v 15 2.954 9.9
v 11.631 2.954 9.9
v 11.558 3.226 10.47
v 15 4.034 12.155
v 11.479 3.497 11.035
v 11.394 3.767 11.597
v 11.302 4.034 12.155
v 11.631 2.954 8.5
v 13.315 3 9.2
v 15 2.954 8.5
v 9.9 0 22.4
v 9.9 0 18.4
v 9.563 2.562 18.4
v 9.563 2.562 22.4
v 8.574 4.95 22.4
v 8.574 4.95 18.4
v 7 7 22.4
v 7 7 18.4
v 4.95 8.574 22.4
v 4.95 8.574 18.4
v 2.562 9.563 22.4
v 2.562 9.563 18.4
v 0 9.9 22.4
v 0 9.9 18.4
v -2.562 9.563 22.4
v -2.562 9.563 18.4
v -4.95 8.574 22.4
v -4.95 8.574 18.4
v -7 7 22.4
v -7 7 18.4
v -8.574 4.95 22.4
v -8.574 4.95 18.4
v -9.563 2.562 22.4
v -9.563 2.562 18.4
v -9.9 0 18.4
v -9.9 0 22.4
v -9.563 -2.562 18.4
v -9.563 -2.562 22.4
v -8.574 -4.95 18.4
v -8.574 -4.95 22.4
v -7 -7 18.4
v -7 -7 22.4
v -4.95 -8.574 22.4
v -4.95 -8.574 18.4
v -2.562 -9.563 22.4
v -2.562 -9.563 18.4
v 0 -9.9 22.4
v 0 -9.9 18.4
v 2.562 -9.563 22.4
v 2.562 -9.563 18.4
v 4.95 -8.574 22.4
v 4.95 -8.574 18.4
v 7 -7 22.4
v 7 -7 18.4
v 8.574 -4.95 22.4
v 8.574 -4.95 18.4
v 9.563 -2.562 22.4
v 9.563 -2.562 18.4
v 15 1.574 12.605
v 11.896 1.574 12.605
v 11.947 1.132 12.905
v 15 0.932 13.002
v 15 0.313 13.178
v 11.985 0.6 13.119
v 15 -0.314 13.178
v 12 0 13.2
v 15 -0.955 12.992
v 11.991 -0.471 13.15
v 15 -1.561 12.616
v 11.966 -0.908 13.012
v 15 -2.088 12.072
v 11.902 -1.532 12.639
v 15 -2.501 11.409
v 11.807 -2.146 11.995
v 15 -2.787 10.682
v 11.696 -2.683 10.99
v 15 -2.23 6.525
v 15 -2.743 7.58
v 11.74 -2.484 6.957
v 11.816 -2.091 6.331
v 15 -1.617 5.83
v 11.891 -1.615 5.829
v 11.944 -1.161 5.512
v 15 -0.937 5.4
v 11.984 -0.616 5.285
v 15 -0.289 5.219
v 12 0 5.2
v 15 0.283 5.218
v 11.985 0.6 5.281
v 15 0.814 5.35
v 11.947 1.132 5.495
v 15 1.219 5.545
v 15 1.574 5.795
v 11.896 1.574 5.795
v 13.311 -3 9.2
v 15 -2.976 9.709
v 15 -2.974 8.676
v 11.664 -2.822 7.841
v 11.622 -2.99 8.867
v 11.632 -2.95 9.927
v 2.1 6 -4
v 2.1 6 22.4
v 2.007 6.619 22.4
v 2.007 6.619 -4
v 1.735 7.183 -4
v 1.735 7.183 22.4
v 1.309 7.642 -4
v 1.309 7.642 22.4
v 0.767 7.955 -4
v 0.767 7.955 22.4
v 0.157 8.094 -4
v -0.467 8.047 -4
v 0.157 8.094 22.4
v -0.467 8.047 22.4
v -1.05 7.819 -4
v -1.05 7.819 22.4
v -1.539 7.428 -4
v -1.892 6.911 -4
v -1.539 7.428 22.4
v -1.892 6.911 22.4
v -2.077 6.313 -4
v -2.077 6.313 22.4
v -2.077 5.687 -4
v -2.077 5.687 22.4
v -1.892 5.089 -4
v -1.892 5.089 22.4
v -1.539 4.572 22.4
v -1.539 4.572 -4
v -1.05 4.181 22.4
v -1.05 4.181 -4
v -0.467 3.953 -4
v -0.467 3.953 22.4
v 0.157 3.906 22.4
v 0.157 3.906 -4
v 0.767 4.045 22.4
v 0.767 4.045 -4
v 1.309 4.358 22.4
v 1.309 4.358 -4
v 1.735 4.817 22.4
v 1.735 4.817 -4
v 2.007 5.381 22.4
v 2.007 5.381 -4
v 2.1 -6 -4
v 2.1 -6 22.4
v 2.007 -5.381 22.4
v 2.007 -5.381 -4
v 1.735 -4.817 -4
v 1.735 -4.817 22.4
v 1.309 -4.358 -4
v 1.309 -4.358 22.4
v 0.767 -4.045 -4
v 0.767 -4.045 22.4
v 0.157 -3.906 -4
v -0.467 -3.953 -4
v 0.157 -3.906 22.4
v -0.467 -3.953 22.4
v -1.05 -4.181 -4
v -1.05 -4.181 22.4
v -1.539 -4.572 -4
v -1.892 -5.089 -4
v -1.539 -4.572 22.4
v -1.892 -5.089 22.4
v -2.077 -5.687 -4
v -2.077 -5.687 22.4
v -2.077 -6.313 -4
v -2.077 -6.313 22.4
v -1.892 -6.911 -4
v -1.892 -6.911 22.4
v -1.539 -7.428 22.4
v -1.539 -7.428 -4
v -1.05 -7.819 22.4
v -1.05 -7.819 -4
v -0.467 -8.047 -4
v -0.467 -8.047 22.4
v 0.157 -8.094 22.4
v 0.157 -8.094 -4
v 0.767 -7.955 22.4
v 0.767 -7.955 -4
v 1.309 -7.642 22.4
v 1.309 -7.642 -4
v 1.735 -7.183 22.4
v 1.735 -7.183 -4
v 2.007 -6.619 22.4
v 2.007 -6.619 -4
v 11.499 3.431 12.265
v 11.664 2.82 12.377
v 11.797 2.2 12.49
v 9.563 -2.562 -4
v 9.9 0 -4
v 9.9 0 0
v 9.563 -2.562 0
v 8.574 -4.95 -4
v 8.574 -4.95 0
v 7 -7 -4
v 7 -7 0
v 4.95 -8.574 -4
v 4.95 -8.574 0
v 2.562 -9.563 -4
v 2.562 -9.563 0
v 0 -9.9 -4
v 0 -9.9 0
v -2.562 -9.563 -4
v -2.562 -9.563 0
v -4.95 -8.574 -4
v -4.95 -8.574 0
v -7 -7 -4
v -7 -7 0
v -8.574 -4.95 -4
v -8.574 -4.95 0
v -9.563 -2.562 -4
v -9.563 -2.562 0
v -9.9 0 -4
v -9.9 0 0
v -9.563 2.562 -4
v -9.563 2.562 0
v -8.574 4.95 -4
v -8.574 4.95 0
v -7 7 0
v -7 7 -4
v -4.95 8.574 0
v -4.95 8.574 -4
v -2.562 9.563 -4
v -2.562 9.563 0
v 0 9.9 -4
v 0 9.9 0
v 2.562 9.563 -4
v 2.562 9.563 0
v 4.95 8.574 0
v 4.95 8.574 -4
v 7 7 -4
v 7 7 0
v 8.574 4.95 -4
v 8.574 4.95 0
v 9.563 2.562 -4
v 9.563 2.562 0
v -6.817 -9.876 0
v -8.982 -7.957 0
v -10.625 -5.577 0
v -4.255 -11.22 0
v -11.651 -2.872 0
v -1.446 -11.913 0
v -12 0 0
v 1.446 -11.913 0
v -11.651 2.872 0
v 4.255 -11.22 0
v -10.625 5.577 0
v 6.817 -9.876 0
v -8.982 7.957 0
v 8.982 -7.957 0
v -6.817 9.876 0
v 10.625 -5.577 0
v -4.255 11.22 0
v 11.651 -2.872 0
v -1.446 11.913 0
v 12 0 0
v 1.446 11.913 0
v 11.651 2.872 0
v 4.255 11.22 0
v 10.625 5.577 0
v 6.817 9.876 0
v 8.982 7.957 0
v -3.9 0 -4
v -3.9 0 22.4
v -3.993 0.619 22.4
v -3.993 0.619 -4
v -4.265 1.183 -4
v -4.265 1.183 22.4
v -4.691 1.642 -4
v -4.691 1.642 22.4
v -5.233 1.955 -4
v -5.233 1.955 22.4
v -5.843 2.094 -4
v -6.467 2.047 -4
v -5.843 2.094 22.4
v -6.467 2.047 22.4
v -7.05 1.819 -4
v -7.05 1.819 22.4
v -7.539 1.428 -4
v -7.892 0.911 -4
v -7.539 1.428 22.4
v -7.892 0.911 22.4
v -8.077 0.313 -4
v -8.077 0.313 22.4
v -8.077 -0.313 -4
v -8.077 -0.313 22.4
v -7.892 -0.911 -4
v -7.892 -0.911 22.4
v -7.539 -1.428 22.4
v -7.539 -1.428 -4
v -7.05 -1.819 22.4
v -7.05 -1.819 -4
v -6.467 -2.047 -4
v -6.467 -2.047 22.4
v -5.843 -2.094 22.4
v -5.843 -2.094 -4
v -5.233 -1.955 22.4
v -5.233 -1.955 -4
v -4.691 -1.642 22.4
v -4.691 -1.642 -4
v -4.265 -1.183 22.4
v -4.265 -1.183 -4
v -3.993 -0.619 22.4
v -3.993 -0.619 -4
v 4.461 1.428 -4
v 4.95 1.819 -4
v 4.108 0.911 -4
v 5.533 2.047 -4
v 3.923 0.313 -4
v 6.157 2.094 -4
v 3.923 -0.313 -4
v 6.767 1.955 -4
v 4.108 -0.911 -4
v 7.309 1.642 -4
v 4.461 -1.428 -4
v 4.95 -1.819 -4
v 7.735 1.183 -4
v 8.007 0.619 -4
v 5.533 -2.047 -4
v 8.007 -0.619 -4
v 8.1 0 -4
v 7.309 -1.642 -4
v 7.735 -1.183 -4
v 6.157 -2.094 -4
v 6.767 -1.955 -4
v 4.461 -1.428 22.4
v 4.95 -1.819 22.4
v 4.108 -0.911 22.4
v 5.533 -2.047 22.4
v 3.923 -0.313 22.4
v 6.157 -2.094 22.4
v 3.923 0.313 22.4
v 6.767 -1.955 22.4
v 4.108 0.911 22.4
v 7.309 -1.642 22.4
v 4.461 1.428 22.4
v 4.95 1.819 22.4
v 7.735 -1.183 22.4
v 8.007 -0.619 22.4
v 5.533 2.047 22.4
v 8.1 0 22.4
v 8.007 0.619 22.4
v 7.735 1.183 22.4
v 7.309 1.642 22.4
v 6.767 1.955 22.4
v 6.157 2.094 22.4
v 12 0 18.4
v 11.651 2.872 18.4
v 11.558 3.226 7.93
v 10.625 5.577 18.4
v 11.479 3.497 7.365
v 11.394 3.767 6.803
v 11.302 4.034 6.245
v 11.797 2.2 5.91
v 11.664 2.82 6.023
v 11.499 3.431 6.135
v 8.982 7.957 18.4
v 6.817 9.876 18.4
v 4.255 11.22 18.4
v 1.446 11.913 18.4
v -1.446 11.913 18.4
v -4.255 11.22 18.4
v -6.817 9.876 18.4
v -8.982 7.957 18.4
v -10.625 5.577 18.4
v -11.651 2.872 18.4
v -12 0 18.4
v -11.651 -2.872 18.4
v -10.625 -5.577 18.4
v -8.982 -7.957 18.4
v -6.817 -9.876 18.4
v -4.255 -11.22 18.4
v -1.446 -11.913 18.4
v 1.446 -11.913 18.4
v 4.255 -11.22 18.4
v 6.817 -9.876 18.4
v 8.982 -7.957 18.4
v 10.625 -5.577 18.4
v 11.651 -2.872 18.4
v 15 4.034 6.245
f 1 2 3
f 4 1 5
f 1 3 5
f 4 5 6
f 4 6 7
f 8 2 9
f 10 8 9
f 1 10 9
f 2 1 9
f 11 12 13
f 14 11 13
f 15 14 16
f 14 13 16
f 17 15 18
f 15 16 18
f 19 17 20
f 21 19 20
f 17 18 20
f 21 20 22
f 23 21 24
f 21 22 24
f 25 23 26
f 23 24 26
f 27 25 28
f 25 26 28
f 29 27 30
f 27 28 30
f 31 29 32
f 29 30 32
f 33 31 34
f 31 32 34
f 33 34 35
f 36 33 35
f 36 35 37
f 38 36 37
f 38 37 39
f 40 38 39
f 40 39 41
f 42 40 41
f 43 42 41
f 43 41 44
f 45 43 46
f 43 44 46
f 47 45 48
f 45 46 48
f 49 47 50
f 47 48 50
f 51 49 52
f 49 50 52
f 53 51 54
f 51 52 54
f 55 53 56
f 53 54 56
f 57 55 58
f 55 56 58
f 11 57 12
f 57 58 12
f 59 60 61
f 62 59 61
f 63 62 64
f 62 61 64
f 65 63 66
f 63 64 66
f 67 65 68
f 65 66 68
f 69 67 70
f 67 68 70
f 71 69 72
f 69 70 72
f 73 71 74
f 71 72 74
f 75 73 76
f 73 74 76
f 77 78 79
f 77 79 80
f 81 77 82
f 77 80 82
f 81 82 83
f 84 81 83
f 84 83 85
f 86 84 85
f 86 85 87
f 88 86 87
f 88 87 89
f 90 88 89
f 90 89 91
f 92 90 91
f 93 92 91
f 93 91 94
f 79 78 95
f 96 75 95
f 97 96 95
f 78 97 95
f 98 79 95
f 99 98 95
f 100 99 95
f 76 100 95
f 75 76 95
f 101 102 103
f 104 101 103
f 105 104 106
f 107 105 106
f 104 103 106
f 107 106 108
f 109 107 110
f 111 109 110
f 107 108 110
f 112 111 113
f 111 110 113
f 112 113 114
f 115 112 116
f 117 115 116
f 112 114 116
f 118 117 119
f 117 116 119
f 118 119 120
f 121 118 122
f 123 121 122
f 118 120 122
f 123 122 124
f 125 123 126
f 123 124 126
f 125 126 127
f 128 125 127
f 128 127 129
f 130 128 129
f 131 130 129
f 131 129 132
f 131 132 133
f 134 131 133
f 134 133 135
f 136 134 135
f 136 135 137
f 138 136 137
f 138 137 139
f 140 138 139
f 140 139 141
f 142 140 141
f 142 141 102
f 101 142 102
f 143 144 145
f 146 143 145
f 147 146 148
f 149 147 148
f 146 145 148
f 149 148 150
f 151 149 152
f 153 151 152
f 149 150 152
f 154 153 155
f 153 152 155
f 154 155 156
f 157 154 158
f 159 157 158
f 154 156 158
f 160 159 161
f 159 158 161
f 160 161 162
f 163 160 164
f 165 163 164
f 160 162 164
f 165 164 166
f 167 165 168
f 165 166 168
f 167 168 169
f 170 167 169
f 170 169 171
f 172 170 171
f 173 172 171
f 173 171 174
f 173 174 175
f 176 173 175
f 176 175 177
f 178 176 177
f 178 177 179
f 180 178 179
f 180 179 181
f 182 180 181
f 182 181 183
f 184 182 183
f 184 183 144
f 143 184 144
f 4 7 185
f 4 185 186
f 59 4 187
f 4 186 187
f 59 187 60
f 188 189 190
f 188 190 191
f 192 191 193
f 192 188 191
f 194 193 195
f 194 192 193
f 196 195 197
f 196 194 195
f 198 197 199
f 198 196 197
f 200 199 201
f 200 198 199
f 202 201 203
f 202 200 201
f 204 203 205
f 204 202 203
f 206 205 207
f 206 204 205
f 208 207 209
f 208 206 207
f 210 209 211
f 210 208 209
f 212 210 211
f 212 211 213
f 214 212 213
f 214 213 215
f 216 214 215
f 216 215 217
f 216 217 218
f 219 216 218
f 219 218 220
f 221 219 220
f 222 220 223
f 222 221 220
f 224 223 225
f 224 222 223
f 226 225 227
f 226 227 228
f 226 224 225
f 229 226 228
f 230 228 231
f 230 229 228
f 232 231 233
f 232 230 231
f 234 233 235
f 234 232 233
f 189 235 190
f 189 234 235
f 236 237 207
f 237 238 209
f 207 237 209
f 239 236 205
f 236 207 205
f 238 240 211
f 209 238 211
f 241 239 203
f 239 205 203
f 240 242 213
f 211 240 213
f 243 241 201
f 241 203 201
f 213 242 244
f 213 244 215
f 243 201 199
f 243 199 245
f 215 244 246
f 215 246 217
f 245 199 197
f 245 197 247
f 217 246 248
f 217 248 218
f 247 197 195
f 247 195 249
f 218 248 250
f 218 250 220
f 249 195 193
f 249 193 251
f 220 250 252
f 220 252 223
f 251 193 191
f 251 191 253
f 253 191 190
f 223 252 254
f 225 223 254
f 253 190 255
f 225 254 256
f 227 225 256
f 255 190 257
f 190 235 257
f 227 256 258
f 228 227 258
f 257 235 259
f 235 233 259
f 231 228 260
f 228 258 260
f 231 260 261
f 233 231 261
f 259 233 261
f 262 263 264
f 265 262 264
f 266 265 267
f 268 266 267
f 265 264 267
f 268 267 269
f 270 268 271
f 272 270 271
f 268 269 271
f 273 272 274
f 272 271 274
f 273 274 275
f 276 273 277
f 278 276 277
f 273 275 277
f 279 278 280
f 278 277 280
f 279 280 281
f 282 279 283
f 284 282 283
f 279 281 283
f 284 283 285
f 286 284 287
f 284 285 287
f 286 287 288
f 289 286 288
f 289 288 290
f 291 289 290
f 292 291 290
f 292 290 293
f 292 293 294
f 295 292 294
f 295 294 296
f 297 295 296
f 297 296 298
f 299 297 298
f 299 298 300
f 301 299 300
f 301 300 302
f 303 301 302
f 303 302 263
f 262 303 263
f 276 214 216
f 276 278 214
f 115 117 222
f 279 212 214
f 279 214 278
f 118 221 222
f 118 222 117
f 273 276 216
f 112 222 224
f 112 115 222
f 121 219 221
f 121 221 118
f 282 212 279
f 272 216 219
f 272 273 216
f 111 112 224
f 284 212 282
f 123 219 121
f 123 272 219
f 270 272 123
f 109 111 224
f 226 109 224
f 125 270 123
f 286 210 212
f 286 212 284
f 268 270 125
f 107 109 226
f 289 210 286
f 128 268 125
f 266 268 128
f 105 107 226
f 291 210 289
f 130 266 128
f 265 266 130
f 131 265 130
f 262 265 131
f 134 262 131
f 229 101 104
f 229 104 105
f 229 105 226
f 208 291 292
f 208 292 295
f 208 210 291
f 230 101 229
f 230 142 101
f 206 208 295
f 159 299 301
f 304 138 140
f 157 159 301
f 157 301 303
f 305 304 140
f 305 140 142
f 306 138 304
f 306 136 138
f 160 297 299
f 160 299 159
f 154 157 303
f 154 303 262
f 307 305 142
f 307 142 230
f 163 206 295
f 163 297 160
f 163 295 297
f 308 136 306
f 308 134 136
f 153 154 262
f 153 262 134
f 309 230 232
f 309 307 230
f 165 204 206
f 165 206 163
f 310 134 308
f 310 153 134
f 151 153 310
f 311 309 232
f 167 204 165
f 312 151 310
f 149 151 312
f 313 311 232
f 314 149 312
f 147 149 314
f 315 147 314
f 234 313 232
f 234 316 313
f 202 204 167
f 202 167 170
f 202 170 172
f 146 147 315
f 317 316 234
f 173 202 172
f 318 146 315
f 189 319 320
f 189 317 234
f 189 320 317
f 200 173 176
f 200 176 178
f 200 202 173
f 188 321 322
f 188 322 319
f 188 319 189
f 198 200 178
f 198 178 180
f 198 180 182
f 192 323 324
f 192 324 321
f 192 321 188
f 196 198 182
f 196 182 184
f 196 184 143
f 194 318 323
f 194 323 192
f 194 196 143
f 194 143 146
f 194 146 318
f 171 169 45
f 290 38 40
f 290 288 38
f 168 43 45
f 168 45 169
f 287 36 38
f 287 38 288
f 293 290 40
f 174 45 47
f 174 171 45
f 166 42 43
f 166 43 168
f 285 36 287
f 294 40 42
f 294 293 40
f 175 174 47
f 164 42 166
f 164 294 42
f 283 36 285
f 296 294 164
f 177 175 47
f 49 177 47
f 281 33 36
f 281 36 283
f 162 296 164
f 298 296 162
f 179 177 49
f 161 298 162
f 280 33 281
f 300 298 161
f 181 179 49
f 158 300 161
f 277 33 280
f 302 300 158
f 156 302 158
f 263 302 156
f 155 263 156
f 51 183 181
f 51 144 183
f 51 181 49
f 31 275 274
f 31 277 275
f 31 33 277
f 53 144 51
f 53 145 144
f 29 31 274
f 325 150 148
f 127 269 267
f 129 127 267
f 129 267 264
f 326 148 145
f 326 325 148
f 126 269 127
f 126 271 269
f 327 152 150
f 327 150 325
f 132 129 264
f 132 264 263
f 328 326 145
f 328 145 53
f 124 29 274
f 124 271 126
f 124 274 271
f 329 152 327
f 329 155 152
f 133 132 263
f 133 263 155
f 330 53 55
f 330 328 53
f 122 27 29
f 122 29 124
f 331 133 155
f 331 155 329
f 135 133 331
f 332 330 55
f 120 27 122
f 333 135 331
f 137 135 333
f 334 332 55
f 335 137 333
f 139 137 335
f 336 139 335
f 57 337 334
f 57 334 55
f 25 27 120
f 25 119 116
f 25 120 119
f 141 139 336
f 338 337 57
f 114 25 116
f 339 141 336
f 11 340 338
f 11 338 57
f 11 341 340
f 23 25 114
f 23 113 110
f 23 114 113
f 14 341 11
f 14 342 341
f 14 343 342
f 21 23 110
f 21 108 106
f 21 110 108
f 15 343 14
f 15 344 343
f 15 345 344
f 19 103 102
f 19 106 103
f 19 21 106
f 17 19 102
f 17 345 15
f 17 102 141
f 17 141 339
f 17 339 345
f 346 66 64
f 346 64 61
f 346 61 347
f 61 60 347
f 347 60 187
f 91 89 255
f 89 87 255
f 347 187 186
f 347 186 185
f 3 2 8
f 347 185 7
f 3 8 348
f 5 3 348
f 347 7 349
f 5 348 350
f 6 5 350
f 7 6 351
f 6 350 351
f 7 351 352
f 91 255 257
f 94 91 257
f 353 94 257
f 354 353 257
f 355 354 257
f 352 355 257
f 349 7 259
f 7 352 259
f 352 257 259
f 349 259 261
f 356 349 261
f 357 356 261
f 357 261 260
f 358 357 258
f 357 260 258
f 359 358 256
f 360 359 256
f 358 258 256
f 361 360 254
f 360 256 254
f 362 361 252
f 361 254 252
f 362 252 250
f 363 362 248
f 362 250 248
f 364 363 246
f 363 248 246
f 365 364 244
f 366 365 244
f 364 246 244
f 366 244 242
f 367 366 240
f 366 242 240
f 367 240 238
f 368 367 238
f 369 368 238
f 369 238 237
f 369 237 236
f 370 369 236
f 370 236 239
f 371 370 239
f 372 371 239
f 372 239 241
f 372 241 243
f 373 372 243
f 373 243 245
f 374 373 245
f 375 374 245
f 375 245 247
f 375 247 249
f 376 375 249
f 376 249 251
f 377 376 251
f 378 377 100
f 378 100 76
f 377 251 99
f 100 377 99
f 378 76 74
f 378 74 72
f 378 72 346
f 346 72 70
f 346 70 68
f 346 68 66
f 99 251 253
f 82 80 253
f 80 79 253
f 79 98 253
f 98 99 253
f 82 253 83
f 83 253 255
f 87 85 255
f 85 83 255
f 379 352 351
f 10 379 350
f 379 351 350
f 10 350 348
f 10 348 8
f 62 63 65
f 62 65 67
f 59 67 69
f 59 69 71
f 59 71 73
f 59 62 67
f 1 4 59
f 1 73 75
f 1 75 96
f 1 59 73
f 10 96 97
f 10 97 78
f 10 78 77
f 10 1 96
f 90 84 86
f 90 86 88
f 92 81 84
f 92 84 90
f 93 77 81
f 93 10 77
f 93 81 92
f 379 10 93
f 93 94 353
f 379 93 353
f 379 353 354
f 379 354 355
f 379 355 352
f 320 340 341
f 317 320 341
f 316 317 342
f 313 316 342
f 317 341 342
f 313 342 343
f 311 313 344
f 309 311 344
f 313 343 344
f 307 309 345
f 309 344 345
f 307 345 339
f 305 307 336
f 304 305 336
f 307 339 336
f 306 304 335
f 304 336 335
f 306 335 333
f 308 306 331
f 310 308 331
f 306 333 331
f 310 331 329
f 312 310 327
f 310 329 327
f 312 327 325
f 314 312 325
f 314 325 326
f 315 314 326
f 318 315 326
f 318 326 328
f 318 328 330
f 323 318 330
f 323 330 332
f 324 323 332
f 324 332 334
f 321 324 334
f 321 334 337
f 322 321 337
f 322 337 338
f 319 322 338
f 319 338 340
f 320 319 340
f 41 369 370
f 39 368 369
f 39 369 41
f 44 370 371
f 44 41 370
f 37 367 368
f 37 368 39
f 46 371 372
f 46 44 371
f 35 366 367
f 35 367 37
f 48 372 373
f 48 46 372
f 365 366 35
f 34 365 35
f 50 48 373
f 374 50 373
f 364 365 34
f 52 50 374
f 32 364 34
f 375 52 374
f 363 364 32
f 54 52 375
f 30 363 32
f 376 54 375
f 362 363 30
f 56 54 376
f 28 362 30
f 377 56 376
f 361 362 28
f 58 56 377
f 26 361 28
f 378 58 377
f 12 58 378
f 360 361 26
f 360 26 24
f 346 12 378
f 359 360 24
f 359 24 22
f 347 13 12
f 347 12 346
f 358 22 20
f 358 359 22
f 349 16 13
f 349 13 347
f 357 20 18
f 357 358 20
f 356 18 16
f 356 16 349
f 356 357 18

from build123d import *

# Parameters (mm, degrees)
SKETCH_1_R          = 12
EXTRUDE_1_DEPTH     = 18.4
SKETCH_2_R          = 9.9
EXTRUDE_2_DEPTH     = 4
EXTRUDE_START       = 4
SKETCH_3_R          = 9.9
EXTRUDE_3_DEPTH     = 4
EXTRUDE_4_DEPTH     = 15
SKETCH_4_R          = 2.1
CUT_EXTRUDE_1_DEPTH = 33.649042948


with BuildPart() as part:
    # 草图1 → 凸台-拉伸1 (new body)
    with BuildSketch(Plane.XY):
        Circle(SKETCH_1_R)
    extrude(amount=EXTRUDE_1_DEPTH)

    # 草图2 → 凸台-拉伸2 (add)
    with BuildSketch(Plane.XY.offset(18.4)):
        Circle(SKETCH_2_R)
    extrude(amount=EXTRUDE_2_DEPTH)

    # 草图3 → 凸台-拉伸3 (add)
    with BuildSketch(Plane(origin=(0, 0, 0), x_dir=(-1, 0, 0), z_dir=(0, 0, -1)).offset(EXTRUDE_START)):
        with Locations(Location((0, 0, 0), (0, 0, 180))):
            Circle(SKETCH_3_R)
    extrude(amount=-EXTRUDE_3_DEPTH)

    # 草图7 → 凸台-拉伸4 (add)
    with BuildSketch(Plane(origin=(0, 0, 0), x_dir=(0, 0, -1), z_dir=(1, 0, 0))):
        with BuildLine():
            Line((-12.154769624, 4.033526555), (-12.60491347, 1.574386356))
            add(Edge.make_bspline(
                [(-12.60491347, 1.574386356), (-16.365153372, -3), (-9.2, -3), (-2.034846628, -3), (-5.79508653, 1.574386356)],
                knots=[2.589117856, 2.589117856, 2.589117856, 4.71238898, 4.71238898, 6.835660105, 6.835660105, 6.835660105], degree=2, weights=[1, 0.487444637, 1, 0.487444637, 1]))
            Line((-5.79508653, 1.574386356), (-6.245230376, 4.033526555))
            Line((-6.245230376, 4.033526555), (-8.5, 2.9537053))
            add(Edge.make_bspline(
                [(-8.5, 2.9537053), (-9.2, 3.047020297), (-9.9, 2.9537053)],
                knots=[1.394890559, 1.394890559, 1.394890559, 1.746702095, 1.746702095, 1.746702095], degree=2, weights=[1, 0.984568433, 1]))
            Line((-9.9, 2.9537053), (-12.154769624, 4.033526555))
        make_face()
    extrude(amount=EXTRUDE_4_DEPTH)

    # 草图4 → 切除-拉伸1 (cut, through all)
    with BuildSketch(Plane.XY.offset(22.4)):
        with Locations((0, 6)):
            Circle(SKETCH_4_R)
        with Locations((6, 0)):
            Circle(SKETCH_4_R)
        with Locations((0, -6)):
            Circle(SKETCH_4_R)
        with Locations((-6, 0)):
            Circle(SKETCH_4_R)
    extrude(amount=-CUT_EXTRUDE_1_DEPTH, mode=Mode.SUBTRACT)


solid = part.part
